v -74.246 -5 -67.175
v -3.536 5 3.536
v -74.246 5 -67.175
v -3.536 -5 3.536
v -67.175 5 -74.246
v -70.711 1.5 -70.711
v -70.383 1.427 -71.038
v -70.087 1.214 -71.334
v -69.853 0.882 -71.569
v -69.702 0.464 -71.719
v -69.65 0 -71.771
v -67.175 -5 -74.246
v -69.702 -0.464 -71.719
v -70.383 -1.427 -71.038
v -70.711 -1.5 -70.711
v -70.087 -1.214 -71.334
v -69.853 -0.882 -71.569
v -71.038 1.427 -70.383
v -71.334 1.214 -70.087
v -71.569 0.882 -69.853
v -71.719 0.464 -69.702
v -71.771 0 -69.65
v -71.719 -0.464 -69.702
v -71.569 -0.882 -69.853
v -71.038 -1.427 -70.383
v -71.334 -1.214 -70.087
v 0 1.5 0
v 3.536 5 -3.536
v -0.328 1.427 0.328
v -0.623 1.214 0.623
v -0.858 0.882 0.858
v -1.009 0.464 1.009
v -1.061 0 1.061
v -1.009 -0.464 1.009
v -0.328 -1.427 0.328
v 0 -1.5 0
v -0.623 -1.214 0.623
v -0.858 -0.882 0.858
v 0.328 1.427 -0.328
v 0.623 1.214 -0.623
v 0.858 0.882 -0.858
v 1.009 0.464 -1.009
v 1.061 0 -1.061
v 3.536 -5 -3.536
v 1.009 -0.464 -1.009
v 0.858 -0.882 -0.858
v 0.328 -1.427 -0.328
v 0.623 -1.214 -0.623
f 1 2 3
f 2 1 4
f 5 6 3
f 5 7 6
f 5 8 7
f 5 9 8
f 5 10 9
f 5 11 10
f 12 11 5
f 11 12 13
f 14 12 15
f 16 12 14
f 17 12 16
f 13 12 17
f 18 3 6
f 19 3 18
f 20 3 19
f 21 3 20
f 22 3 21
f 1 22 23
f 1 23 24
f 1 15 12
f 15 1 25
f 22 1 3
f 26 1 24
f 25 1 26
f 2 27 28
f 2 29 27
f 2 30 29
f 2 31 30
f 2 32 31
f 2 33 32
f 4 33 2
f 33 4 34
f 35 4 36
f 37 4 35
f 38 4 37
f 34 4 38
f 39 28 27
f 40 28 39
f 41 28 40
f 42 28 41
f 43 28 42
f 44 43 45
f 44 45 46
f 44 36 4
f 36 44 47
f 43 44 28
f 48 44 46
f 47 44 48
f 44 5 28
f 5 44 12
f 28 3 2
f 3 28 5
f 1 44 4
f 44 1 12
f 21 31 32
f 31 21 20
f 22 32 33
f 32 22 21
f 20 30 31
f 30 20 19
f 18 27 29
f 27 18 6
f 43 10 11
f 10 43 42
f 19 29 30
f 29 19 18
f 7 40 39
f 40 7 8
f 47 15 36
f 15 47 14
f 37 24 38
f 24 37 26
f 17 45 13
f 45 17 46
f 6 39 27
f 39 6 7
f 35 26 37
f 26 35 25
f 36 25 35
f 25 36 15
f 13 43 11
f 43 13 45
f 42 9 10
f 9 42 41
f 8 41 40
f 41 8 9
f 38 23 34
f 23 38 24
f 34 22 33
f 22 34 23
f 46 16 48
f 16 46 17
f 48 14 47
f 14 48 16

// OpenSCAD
// file: stack_params.scad
stackInnerR = 26/2;
stackWallT = 3;

assemblyScrewR = 4/2;
assemblyScrewCenterR = stackInnerR+assemblyScrewR+0.5; // give ourselves clearance

stackOuterR = assemblyScrewCenterR+assemblyScrewR+stackWallT;



nutHeadWidth = 7;
nutHeadHeight = 3;

boltL = 20; // 20mm M4 bolts


flangeW = 10;
flangeH = 10;
flangeHoleR = 4.5/2;
flangeHoleHead = 7.6/2;
flangeHoleD = 3;

baseT = nutHeadHeight+2;

bodyH = boltL-baseT;

usbCableR = 3.75/2;



lensEndD = 15;
lensEndH = 3;
cameraEndD = 6;
cameraEndH = 2.5;

wallT = 2;

lensStackH = lensEndH+cameraEndH;
lensStackD = max(lensEndD, cameraEndD)+2*wallT;
// main file
include <stack_params.scad>;

theta = 45; // angle for finished standoffs


rotate([0,theta-180,0])
difference() {
  translate([-flangeW/2, -flangeH/2,0])
  cube([flangeH, flangeW, 100], false);
  # cylinder(100, flangeHoleD/2, flangeHoleD/2, false, $fn=20);
}
